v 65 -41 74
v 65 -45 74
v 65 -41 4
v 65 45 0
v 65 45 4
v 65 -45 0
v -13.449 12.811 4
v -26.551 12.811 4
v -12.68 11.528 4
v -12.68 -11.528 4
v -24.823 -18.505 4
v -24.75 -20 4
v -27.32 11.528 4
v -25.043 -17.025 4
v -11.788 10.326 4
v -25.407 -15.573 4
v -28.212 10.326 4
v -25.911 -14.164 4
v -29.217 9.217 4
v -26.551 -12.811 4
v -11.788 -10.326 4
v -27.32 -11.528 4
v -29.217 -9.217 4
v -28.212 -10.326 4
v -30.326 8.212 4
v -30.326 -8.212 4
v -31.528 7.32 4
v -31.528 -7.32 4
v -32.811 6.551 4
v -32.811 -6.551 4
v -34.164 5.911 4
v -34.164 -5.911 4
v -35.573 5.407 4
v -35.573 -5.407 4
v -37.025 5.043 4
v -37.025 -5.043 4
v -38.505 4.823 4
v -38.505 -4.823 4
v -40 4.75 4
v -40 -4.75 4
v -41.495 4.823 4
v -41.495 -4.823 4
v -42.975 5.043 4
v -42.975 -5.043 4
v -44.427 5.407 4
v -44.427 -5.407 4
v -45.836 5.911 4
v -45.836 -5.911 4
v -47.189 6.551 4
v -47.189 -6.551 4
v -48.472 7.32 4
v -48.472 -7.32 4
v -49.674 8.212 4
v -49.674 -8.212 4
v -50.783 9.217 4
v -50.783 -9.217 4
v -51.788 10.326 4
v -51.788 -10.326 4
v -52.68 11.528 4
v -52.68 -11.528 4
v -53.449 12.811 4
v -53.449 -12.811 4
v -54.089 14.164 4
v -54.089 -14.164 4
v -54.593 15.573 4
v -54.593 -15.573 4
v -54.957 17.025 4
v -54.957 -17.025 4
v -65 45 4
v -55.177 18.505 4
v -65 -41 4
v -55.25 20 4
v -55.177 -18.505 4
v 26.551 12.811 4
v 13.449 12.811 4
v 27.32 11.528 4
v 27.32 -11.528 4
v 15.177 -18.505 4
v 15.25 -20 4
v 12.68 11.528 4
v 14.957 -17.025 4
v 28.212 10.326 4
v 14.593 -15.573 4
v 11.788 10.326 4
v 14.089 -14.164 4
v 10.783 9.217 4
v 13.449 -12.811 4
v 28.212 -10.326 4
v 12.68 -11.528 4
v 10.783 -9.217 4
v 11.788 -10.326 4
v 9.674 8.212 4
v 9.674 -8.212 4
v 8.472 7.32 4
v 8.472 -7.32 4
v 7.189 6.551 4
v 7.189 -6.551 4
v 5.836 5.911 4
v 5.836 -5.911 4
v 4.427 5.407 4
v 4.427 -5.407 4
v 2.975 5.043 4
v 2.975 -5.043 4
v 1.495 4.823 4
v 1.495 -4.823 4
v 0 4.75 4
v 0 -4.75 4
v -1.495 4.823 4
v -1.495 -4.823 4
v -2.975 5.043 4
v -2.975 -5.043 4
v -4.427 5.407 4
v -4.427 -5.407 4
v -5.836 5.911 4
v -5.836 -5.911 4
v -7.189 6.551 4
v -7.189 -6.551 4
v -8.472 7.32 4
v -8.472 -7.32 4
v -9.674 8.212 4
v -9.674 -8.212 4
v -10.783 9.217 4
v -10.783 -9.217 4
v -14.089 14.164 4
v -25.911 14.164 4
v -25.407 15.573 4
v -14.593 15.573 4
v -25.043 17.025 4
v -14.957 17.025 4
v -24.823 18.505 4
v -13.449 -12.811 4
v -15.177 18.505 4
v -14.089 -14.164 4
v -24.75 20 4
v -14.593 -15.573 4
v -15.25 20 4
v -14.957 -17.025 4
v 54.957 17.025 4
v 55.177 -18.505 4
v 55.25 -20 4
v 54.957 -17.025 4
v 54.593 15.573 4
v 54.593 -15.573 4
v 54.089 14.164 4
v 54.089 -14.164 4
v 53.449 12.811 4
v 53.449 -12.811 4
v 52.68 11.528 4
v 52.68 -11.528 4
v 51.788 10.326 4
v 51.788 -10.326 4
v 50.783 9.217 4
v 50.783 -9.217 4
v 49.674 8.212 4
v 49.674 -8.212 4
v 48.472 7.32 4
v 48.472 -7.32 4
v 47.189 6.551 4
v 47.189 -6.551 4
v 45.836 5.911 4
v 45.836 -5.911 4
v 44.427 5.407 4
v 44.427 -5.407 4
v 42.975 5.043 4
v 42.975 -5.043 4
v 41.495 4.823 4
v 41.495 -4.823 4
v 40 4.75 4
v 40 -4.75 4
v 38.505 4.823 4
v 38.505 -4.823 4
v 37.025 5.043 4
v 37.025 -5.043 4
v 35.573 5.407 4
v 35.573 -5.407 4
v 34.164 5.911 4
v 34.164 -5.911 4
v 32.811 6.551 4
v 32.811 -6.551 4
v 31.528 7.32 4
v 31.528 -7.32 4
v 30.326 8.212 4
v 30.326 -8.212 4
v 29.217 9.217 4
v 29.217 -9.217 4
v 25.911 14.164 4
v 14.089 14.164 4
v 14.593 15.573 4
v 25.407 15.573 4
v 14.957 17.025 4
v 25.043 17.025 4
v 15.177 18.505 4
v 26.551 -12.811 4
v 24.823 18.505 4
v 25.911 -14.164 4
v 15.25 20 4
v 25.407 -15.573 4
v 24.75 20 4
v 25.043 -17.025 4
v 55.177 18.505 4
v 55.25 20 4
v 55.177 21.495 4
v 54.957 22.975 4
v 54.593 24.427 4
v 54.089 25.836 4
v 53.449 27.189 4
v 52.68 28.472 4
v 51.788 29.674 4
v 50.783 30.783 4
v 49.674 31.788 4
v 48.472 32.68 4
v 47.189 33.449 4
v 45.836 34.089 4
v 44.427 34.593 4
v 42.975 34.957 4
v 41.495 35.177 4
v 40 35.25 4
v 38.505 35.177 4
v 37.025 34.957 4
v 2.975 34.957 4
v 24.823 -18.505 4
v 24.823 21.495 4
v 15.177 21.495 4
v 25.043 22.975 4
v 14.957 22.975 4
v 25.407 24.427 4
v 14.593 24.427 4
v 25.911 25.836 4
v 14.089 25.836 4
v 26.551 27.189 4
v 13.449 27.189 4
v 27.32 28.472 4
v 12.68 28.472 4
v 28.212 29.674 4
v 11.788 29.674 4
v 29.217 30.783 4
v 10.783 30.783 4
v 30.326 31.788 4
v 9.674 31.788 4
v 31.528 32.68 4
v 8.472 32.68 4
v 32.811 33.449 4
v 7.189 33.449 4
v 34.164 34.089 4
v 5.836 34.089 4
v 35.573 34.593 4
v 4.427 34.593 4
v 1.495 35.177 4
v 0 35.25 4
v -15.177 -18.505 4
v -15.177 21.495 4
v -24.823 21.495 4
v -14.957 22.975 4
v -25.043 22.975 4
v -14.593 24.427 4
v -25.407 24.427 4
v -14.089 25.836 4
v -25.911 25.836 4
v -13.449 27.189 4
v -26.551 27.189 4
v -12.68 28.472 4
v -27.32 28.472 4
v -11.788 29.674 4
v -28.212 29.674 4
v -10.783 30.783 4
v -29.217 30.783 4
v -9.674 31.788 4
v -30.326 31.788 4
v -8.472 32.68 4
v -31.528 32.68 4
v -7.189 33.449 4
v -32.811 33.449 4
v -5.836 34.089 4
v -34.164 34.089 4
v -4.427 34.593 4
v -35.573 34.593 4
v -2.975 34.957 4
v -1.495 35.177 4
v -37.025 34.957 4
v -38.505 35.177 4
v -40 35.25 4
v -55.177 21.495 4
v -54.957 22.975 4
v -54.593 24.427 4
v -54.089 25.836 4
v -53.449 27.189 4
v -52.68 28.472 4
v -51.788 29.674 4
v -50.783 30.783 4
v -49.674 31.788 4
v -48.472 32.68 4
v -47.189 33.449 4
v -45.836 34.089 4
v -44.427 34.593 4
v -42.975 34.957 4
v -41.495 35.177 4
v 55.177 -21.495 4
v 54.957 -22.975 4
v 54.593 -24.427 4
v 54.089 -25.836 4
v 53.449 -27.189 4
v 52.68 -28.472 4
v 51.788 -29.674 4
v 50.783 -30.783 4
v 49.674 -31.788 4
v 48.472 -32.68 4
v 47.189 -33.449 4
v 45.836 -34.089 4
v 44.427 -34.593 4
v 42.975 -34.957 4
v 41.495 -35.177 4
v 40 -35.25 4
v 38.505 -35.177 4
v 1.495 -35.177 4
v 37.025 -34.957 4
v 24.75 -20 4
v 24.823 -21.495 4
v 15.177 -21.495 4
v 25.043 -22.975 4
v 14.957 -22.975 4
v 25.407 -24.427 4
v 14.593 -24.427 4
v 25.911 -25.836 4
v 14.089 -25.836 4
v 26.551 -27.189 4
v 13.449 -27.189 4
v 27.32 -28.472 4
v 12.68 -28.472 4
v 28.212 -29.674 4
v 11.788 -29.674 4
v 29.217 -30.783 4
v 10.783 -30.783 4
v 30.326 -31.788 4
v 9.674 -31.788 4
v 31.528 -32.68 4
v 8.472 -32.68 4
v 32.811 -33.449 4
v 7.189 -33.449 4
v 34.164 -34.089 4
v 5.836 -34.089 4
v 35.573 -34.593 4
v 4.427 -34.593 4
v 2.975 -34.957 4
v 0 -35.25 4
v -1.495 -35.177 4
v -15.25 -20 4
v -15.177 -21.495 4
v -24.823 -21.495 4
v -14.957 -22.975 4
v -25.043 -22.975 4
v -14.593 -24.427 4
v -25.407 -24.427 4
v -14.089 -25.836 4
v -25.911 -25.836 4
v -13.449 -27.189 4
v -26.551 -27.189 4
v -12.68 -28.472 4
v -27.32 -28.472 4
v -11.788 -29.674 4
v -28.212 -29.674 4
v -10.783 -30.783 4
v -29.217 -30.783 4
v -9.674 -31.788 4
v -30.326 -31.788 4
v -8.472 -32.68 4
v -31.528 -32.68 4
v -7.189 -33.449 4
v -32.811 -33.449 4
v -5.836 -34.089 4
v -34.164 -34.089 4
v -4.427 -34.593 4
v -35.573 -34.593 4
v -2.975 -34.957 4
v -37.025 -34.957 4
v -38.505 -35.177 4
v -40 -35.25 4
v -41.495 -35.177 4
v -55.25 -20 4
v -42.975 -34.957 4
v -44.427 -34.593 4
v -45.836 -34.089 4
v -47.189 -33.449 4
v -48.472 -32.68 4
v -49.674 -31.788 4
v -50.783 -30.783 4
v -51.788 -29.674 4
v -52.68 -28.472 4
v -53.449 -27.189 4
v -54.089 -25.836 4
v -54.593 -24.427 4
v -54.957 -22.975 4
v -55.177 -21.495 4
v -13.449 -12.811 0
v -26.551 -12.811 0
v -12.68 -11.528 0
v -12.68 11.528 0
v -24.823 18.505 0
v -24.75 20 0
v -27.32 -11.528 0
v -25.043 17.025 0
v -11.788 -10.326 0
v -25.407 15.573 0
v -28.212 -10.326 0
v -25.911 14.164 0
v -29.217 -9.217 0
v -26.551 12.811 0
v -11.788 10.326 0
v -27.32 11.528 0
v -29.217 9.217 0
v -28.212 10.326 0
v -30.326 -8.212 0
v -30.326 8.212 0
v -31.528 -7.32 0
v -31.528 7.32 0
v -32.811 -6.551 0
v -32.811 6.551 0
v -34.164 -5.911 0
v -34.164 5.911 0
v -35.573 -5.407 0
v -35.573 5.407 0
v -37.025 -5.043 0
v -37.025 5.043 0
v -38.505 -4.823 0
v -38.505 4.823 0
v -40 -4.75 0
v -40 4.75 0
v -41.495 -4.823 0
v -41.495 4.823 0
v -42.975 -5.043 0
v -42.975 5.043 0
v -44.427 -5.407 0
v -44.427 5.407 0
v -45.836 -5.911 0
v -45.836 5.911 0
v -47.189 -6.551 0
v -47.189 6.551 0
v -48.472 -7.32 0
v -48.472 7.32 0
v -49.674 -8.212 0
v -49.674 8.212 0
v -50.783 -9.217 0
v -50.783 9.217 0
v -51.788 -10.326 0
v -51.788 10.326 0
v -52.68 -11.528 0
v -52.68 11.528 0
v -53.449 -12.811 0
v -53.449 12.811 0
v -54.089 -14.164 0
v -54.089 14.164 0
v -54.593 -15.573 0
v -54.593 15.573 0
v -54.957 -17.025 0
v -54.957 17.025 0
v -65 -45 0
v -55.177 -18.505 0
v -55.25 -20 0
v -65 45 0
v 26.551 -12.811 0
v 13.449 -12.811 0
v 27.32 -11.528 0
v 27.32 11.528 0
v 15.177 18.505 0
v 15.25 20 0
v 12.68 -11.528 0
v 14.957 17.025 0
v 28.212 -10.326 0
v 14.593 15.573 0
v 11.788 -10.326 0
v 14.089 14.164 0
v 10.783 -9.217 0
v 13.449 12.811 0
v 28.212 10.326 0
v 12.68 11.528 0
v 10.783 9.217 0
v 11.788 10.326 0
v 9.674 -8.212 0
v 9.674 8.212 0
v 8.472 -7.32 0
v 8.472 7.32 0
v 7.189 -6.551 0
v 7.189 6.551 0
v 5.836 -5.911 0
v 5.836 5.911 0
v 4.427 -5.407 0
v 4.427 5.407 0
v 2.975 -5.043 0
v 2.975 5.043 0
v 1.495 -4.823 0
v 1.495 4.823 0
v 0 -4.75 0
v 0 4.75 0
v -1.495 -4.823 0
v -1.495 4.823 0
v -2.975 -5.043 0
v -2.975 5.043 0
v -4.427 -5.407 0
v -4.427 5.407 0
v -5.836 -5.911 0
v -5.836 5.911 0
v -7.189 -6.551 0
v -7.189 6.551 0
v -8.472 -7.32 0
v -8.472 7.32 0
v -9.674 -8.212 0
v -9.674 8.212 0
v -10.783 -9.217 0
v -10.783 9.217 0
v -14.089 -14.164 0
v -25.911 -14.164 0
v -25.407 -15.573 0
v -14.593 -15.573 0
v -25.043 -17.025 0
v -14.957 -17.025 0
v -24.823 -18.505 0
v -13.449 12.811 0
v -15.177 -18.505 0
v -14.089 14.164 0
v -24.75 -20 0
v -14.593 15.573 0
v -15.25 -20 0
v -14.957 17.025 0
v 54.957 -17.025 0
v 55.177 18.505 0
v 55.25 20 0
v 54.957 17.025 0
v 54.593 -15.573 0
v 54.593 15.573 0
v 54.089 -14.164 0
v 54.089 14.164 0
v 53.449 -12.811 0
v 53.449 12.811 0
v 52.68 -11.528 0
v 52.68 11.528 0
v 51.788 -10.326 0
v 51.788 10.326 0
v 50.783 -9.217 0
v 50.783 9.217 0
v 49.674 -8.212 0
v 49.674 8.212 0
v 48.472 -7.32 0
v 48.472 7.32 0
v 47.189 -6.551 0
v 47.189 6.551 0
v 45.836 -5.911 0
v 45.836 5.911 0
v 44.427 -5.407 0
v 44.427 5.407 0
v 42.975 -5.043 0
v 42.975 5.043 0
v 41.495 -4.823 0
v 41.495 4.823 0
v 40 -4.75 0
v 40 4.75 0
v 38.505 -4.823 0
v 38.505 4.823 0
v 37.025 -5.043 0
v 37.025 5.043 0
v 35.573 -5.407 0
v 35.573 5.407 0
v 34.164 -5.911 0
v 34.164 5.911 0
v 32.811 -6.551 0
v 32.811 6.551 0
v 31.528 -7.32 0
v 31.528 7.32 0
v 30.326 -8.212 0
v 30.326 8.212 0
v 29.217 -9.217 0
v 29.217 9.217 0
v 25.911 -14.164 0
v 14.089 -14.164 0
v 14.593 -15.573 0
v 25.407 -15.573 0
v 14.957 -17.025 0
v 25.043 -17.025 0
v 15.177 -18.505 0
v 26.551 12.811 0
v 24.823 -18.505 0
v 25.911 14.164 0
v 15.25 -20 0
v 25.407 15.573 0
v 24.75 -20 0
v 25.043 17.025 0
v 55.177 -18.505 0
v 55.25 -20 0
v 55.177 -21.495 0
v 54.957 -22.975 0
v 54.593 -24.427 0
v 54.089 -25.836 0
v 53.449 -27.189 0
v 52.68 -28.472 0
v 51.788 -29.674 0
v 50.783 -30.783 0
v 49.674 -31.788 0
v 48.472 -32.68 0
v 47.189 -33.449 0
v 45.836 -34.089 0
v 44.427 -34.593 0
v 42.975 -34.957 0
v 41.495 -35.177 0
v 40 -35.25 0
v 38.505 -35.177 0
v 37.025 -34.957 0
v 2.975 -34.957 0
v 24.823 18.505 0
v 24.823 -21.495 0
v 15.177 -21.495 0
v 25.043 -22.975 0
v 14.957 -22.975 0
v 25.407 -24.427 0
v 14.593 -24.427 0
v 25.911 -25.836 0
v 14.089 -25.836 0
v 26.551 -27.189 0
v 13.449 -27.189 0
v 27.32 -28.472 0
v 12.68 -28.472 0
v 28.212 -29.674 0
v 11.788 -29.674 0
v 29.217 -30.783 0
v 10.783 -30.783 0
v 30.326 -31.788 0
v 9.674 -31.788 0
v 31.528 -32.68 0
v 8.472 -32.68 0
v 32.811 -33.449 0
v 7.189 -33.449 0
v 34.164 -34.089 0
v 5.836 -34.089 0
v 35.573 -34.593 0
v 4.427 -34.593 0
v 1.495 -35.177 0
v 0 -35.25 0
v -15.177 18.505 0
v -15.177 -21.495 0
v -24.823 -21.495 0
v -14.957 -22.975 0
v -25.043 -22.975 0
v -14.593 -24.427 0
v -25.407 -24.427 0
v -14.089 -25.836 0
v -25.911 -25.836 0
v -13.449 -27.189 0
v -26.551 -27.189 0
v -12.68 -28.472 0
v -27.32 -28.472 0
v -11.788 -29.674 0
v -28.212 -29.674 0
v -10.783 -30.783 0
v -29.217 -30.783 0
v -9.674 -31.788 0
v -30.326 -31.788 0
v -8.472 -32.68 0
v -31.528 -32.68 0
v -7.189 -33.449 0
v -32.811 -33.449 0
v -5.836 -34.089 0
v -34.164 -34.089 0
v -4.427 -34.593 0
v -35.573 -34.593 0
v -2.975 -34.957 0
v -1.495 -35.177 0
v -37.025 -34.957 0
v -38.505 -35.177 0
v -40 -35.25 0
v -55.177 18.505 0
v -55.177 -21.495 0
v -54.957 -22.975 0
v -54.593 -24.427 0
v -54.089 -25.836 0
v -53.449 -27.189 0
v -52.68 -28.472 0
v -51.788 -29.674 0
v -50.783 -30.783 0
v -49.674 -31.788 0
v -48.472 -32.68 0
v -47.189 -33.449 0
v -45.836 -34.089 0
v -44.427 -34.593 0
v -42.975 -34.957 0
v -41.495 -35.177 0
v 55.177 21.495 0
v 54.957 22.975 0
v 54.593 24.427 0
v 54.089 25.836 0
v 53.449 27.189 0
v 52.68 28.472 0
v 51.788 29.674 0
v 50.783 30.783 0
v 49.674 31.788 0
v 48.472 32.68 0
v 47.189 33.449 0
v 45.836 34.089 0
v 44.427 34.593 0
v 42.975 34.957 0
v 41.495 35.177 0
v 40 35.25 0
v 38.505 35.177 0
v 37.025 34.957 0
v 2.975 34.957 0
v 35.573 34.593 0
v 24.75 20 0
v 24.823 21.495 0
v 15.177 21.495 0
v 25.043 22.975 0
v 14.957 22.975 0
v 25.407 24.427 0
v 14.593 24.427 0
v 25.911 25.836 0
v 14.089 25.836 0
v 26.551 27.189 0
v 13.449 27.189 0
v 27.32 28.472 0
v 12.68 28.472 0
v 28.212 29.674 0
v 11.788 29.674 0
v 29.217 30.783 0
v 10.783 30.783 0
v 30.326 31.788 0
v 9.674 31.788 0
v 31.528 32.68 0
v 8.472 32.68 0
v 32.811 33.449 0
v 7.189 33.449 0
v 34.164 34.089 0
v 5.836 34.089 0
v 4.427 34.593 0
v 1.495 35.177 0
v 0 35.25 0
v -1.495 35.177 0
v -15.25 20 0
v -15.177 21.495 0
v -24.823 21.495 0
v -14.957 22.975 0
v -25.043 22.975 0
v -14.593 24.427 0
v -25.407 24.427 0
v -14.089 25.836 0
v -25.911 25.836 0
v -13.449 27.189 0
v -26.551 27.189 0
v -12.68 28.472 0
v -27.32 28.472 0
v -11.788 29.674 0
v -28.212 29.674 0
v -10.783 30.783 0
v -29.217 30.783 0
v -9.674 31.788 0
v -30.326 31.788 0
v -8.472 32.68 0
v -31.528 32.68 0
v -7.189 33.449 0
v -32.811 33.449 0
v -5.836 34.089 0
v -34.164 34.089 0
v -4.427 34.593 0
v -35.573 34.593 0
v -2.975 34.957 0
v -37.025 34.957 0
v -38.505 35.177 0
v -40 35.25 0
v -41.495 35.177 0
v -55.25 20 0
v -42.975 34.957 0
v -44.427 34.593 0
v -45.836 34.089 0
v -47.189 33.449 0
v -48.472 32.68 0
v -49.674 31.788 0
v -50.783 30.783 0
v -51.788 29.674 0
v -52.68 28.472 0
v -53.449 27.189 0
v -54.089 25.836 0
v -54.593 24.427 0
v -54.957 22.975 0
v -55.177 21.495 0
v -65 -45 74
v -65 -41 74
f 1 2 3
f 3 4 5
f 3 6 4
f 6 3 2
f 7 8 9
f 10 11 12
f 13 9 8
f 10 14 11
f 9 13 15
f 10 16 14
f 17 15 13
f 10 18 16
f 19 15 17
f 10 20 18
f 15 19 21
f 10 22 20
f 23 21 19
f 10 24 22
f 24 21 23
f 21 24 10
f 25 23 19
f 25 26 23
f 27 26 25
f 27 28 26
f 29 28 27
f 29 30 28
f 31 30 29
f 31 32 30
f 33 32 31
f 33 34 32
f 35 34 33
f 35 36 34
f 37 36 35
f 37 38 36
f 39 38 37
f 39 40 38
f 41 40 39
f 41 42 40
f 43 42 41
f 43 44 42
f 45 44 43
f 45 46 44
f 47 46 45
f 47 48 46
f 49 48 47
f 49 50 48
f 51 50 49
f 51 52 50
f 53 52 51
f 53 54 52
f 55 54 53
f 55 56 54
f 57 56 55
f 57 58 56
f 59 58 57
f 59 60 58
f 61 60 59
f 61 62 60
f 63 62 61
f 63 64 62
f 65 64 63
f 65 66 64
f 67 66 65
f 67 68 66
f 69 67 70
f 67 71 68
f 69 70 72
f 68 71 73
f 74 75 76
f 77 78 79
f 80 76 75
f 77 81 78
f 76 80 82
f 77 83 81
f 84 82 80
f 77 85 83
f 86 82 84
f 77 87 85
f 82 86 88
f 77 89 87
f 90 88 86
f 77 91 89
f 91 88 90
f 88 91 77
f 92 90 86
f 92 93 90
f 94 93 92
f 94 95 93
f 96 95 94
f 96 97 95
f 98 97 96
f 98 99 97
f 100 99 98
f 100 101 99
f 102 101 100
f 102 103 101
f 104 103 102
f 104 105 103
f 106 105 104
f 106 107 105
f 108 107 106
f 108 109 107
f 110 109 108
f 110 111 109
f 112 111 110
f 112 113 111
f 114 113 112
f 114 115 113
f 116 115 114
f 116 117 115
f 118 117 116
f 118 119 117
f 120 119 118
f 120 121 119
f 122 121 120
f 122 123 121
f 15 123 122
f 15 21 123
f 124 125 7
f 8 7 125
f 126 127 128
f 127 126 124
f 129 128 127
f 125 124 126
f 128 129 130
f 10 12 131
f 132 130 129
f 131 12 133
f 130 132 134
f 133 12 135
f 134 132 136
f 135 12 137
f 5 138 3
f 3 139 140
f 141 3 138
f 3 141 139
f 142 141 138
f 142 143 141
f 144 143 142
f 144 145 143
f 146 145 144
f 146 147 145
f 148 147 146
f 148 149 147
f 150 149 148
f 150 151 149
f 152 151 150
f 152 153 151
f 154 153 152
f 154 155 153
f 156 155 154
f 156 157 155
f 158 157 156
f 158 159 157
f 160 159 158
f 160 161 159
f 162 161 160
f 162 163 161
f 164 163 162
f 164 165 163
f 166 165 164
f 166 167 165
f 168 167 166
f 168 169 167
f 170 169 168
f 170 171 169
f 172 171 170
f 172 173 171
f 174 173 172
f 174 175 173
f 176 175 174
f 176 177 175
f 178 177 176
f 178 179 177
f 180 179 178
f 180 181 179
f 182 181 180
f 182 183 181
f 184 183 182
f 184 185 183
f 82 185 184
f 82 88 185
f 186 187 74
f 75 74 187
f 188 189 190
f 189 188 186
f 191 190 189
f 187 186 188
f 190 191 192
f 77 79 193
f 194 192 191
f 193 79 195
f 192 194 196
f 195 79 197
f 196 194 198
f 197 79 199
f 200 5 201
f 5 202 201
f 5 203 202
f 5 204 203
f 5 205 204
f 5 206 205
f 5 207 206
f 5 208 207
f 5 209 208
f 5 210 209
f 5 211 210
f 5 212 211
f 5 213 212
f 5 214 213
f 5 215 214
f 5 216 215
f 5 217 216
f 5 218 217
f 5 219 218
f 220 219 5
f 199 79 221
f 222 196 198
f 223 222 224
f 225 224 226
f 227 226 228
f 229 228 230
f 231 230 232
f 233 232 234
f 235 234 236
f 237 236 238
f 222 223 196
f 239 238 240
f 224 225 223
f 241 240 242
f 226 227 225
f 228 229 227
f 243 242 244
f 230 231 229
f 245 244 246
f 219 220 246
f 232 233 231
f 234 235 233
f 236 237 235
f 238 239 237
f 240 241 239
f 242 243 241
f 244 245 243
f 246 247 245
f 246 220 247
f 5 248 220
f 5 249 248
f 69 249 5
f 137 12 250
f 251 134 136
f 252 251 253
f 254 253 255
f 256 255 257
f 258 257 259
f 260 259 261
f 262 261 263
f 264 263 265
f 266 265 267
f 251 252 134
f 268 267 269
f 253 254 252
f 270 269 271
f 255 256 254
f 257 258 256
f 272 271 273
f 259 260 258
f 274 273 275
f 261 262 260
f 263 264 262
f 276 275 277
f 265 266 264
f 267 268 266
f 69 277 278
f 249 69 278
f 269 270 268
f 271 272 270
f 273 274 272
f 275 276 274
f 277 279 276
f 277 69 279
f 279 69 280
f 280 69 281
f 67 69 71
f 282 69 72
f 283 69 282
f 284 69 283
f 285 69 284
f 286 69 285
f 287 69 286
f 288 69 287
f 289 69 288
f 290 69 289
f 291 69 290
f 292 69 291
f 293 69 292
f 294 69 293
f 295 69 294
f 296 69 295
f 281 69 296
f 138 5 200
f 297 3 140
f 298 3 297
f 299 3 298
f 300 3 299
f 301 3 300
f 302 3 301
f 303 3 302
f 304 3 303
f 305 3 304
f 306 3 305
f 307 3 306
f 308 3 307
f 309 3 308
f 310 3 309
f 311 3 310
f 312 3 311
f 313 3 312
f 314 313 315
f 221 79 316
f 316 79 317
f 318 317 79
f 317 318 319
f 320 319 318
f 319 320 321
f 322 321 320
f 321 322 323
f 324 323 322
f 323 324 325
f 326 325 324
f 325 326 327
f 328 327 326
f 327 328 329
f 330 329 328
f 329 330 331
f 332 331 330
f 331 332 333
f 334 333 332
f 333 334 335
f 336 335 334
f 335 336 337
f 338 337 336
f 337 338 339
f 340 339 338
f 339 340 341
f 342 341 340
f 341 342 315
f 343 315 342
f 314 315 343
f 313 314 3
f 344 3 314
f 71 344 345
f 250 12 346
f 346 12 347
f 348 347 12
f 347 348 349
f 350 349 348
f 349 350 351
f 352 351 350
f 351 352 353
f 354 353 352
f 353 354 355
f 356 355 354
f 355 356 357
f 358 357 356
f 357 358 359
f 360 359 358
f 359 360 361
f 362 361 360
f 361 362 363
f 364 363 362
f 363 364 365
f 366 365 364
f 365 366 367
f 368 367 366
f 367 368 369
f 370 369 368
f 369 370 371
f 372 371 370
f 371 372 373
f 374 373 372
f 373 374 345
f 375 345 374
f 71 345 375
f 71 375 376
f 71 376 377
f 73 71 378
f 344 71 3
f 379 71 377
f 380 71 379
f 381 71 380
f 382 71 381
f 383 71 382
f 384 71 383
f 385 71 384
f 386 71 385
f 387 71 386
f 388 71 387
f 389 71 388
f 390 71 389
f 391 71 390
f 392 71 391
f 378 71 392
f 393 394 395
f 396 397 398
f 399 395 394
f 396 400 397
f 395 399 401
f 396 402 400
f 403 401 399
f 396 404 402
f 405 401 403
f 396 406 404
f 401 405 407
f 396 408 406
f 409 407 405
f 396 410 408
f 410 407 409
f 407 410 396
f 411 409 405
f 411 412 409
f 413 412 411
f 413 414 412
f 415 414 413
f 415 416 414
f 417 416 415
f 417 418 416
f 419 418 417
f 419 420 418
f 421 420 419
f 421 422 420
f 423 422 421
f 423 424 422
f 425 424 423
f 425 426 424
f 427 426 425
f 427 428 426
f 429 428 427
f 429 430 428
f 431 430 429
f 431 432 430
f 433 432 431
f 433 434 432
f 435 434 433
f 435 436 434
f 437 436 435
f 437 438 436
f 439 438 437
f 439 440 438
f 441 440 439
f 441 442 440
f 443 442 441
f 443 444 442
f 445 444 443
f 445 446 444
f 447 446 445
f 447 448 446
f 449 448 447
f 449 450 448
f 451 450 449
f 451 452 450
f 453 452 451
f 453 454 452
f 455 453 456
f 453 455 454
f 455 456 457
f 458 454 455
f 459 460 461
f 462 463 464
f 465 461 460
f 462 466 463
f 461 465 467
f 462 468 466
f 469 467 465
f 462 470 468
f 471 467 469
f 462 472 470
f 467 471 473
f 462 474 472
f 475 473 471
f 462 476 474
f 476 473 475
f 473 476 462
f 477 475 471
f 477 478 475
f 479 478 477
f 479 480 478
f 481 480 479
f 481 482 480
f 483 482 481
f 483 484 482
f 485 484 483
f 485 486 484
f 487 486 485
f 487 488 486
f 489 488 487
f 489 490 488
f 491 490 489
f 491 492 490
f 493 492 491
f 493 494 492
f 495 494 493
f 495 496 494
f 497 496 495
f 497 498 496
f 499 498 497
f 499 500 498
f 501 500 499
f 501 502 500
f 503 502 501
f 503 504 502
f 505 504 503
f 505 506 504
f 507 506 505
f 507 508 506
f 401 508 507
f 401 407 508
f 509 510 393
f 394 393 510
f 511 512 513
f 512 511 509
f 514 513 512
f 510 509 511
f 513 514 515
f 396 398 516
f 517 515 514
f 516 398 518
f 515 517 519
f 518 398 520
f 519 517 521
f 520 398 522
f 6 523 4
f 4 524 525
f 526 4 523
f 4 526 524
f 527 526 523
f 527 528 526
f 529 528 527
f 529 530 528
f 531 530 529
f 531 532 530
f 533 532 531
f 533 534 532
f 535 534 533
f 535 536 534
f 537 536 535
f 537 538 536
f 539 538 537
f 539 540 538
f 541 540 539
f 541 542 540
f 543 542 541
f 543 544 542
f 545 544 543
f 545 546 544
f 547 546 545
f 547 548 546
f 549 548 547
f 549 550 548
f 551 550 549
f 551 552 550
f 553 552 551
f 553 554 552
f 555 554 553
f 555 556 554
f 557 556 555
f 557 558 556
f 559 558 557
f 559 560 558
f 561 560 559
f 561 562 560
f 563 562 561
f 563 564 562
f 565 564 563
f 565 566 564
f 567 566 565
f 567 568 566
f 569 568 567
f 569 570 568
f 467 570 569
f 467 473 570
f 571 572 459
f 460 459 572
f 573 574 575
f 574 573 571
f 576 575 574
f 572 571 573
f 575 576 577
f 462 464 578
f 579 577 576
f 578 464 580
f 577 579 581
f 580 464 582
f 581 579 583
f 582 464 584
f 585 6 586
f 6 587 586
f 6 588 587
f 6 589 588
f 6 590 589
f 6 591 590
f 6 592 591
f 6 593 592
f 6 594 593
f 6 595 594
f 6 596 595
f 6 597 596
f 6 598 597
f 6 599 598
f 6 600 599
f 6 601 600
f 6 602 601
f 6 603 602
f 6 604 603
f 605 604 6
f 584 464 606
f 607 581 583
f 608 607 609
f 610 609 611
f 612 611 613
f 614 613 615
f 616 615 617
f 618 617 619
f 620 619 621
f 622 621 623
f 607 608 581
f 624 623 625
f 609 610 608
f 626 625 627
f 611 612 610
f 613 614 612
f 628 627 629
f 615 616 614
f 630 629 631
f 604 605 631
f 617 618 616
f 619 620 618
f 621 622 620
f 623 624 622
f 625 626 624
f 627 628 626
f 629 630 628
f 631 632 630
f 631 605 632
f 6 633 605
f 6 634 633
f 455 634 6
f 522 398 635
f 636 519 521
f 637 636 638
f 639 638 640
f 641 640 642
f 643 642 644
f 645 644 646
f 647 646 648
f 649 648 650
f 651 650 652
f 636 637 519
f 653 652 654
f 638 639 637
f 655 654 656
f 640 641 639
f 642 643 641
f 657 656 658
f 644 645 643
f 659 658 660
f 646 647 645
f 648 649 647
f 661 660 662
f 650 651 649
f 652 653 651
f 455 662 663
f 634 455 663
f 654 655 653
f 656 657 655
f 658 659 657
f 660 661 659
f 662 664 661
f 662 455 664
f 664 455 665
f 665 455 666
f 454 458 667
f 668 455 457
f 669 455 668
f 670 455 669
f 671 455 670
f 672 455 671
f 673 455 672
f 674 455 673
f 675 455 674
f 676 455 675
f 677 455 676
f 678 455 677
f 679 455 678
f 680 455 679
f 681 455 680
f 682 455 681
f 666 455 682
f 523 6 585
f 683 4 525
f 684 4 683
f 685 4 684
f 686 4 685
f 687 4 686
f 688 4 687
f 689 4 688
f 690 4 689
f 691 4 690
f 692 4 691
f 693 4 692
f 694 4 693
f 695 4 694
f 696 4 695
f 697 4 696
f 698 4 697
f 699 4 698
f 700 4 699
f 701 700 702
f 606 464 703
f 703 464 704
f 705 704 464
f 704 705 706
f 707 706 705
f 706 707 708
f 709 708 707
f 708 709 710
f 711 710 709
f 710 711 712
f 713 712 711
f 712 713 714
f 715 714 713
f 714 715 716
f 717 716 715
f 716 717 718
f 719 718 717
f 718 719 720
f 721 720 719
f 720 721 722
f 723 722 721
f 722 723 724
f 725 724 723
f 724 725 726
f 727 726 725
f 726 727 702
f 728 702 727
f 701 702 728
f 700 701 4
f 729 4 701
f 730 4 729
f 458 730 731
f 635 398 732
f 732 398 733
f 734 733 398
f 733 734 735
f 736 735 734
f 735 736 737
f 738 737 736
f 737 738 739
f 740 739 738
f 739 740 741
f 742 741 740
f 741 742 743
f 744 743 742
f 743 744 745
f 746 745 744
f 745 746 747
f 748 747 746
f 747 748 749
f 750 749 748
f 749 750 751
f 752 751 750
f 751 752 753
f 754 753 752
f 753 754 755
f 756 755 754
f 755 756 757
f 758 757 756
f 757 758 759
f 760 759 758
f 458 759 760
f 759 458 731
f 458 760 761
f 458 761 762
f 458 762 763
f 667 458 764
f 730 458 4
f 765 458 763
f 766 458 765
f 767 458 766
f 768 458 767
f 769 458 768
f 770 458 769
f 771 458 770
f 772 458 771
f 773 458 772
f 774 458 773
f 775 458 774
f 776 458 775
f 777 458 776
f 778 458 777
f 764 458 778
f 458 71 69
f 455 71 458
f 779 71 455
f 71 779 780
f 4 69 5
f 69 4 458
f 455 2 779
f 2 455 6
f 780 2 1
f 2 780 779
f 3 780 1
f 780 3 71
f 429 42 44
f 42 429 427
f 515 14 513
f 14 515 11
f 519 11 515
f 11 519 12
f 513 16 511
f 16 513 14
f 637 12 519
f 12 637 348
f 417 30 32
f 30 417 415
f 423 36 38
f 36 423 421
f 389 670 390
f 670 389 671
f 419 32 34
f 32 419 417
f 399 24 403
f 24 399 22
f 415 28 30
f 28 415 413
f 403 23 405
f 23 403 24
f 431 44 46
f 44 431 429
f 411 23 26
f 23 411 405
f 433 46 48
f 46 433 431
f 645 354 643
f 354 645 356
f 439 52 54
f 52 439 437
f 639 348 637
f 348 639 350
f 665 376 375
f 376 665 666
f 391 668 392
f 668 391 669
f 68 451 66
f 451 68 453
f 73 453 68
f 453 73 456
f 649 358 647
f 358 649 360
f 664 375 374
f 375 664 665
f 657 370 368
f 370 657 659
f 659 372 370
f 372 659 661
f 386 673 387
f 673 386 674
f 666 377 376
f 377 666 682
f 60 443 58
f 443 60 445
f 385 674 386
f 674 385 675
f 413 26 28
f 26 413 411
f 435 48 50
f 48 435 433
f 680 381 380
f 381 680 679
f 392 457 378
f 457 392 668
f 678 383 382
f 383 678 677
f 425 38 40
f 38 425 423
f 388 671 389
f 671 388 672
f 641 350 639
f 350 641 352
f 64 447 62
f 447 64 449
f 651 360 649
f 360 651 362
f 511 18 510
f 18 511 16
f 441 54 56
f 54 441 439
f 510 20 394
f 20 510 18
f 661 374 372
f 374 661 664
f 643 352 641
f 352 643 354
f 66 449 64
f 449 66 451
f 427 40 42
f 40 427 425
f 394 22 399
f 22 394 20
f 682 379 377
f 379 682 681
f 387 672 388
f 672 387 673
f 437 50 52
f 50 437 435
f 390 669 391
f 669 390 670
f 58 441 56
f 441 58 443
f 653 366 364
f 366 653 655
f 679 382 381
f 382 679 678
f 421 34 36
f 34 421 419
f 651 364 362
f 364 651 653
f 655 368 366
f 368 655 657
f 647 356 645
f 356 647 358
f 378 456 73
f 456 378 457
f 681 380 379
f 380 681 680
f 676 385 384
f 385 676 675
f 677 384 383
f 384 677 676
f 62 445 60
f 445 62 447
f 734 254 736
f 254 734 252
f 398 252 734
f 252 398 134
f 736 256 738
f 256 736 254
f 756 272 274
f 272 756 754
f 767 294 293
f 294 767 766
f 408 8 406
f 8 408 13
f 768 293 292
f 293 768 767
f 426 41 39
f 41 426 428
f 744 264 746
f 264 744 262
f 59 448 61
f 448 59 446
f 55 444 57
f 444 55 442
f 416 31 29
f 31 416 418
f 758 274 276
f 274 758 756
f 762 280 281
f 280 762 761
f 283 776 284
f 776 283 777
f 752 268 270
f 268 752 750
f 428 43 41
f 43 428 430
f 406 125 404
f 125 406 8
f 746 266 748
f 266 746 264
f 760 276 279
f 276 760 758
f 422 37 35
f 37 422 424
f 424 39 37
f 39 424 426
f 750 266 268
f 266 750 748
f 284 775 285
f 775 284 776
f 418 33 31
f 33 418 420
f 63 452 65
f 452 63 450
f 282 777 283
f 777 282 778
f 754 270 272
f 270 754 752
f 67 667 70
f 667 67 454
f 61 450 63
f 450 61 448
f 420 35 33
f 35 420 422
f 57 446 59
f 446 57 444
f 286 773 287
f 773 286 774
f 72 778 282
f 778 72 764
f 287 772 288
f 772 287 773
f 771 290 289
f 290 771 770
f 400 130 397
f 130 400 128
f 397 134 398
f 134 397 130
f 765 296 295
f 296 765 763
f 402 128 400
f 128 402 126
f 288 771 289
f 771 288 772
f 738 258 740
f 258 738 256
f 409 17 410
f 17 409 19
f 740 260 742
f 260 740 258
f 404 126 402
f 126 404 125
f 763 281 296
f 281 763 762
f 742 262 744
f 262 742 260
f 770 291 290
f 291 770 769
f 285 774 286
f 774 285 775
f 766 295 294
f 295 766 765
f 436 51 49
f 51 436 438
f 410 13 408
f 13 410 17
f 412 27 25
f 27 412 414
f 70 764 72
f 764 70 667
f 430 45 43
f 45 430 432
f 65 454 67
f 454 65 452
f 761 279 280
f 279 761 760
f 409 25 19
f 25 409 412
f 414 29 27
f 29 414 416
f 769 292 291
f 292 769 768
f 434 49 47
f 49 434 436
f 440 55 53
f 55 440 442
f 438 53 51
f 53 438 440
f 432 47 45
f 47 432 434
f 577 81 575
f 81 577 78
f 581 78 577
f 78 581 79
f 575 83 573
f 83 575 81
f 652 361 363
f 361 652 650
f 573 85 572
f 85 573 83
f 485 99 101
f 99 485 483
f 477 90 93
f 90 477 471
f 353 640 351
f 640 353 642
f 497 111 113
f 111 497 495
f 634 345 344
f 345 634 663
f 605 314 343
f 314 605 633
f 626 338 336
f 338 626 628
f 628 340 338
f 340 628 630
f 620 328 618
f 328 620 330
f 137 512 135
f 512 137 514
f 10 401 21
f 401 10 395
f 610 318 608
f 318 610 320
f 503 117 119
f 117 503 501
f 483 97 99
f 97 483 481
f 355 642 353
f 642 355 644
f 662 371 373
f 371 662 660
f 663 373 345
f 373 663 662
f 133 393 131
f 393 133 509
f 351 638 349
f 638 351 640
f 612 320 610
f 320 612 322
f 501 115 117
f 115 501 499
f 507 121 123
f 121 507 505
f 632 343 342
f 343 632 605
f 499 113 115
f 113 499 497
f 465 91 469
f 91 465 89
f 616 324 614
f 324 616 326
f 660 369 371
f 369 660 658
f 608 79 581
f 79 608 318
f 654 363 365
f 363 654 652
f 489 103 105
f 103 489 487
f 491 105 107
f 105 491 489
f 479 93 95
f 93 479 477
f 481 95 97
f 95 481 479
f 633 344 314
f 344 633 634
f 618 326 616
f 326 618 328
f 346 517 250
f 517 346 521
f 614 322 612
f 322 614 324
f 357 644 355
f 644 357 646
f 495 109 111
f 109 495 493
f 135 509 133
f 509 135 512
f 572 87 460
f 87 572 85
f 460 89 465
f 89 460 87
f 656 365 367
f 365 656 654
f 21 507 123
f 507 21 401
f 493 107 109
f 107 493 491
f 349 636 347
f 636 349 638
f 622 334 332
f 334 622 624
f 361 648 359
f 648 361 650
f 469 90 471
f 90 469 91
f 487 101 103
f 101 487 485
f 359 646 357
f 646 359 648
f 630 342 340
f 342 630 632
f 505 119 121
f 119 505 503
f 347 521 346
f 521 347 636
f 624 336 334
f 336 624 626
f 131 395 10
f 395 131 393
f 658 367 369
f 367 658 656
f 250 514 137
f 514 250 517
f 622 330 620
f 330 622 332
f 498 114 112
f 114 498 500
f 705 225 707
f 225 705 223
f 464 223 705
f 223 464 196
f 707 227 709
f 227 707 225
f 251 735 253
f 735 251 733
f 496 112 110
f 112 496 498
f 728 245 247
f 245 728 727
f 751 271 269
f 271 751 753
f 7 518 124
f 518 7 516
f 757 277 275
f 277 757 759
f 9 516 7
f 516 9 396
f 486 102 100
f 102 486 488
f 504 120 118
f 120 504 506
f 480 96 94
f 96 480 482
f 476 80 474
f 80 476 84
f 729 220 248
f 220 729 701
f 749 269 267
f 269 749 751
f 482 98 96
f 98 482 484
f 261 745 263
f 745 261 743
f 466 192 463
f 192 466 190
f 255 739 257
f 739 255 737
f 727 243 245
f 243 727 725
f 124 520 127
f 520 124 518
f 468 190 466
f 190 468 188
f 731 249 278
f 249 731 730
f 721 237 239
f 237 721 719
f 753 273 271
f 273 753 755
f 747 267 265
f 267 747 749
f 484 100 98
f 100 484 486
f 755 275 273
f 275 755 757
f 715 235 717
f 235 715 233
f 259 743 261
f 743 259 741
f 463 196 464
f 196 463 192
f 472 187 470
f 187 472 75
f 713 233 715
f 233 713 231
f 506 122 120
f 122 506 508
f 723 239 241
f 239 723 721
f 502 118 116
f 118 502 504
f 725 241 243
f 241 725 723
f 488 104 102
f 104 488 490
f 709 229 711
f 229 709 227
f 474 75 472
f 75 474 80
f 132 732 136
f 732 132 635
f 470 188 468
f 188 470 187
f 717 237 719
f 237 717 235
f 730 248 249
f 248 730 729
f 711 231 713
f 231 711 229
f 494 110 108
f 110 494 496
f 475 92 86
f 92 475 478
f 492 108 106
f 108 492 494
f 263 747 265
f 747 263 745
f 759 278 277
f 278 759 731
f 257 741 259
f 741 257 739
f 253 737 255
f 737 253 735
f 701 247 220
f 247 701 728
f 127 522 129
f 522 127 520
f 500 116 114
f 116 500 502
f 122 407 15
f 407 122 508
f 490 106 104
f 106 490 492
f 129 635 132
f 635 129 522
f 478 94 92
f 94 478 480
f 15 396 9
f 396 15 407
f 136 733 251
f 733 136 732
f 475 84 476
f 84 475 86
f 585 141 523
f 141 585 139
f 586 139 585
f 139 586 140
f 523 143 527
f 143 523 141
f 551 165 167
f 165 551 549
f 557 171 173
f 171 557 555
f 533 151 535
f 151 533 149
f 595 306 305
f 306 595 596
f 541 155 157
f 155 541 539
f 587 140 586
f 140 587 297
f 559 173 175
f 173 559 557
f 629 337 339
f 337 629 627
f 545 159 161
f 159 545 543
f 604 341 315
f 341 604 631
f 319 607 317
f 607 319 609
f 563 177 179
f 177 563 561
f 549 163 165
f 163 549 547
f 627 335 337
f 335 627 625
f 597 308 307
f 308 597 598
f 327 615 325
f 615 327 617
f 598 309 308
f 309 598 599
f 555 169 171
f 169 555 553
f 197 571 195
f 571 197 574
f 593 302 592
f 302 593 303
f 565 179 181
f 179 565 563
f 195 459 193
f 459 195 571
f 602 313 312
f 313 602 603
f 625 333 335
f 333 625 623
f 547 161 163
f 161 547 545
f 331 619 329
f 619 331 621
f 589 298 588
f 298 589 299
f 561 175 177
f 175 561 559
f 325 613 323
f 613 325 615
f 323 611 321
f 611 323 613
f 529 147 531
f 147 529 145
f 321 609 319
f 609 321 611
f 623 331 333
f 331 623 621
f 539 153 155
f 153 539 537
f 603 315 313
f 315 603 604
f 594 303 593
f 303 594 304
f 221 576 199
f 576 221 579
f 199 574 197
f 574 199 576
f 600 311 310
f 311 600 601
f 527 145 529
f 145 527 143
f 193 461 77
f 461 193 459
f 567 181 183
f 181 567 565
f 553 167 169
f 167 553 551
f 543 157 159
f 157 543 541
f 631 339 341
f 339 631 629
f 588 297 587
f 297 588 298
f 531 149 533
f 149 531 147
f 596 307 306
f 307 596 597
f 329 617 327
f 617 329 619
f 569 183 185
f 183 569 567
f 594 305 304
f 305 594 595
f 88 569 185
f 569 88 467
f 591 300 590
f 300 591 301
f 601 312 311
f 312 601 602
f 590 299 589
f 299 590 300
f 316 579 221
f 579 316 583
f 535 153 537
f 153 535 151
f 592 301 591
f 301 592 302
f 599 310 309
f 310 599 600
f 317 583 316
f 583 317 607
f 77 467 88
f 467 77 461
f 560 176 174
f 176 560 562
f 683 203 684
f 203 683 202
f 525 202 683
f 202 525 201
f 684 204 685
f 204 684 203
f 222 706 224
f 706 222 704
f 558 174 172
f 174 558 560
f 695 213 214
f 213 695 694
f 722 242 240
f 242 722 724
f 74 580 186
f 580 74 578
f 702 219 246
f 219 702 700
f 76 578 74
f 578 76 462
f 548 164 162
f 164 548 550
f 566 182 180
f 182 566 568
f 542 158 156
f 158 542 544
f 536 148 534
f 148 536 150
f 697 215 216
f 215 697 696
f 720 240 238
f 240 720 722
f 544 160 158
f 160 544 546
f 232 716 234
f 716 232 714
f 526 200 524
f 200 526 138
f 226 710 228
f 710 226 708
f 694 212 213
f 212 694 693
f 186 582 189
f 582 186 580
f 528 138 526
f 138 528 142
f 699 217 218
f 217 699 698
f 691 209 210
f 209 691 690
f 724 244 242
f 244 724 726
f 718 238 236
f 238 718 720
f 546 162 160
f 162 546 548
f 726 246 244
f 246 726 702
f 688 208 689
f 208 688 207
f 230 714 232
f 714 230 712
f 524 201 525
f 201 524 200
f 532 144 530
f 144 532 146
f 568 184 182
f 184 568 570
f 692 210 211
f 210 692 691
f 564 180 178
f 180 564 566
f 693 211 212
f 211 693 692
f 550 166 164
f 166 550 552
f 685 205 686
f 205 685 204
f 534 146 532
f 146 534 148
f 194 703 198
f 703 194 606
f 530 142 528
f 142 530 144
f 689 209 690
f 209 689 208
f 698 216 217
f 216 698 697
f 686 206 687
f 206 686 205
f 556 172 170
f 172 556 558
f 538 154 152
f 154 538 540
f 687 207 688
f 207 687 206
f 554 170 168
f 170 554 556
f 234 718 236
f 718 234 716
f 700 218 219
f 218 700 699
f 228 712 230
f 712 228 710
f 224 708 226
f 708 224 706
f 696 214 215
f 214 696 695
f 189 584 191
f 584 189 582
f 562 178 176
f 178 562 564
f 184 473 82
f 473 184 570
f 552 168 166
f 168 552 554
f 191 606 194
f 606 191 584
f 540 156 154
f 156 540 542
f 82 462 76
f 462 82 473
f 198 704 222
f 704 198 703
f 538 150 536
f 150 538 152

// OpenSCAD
// Rack for six 50 mL conical (Falcon-type) tubes.
// Print orientation: Flat plate on bed (z=0), walls rising to z=70.
// After printing, flip over so walls are on the bed and tubes hang down.

// Plate dimensions
L     = 130; // Length (X)
W     = 90;  // Width (Y)
t     = 4;   // Plate thickness (Z)

// Hole specifications
hole_d  = 30.5;

// Grid layout
row_spacing = 40; // Centre-to-centre Y
col_spacing = 40; // Centre-to-centre X

// Wall specifications
wall_h = 70; // Height of walls from plate top (z=4)
wall_t = 4;  // Thickness of walls (Y)

// Derived positions
// Centred on origin in X and Y
// 3 holes along X: positions -40, 0, 40
// 2 holes along Y: positions -20, 20
x_positions = [-40, 0, 40];
y_positions = [-20, 20];

$fn = 64;

difference() {
    union() {
        // 1. The flat base plate
        translate([-L / 2, -W / 2, 0]) cube([L, W, t]);

        // 2. The two side walls
        // Left wall (at -L/2)
        translate([-L / 2, -W / 2, t]) cube([L, wall_t, wall_h]);
        // Right wall (at +L/2)
        translate([L / 2 - L, -W / 2, t]) cube([L, wall_t, wall_h]);
    }

    // Cut the holes for the tubes
    for (x = x_positions) {
        for (y = y_positions) {
            translate([x, y, 0]) cylinder(h = t + 1, d = hole_d);
        }
    }
}
